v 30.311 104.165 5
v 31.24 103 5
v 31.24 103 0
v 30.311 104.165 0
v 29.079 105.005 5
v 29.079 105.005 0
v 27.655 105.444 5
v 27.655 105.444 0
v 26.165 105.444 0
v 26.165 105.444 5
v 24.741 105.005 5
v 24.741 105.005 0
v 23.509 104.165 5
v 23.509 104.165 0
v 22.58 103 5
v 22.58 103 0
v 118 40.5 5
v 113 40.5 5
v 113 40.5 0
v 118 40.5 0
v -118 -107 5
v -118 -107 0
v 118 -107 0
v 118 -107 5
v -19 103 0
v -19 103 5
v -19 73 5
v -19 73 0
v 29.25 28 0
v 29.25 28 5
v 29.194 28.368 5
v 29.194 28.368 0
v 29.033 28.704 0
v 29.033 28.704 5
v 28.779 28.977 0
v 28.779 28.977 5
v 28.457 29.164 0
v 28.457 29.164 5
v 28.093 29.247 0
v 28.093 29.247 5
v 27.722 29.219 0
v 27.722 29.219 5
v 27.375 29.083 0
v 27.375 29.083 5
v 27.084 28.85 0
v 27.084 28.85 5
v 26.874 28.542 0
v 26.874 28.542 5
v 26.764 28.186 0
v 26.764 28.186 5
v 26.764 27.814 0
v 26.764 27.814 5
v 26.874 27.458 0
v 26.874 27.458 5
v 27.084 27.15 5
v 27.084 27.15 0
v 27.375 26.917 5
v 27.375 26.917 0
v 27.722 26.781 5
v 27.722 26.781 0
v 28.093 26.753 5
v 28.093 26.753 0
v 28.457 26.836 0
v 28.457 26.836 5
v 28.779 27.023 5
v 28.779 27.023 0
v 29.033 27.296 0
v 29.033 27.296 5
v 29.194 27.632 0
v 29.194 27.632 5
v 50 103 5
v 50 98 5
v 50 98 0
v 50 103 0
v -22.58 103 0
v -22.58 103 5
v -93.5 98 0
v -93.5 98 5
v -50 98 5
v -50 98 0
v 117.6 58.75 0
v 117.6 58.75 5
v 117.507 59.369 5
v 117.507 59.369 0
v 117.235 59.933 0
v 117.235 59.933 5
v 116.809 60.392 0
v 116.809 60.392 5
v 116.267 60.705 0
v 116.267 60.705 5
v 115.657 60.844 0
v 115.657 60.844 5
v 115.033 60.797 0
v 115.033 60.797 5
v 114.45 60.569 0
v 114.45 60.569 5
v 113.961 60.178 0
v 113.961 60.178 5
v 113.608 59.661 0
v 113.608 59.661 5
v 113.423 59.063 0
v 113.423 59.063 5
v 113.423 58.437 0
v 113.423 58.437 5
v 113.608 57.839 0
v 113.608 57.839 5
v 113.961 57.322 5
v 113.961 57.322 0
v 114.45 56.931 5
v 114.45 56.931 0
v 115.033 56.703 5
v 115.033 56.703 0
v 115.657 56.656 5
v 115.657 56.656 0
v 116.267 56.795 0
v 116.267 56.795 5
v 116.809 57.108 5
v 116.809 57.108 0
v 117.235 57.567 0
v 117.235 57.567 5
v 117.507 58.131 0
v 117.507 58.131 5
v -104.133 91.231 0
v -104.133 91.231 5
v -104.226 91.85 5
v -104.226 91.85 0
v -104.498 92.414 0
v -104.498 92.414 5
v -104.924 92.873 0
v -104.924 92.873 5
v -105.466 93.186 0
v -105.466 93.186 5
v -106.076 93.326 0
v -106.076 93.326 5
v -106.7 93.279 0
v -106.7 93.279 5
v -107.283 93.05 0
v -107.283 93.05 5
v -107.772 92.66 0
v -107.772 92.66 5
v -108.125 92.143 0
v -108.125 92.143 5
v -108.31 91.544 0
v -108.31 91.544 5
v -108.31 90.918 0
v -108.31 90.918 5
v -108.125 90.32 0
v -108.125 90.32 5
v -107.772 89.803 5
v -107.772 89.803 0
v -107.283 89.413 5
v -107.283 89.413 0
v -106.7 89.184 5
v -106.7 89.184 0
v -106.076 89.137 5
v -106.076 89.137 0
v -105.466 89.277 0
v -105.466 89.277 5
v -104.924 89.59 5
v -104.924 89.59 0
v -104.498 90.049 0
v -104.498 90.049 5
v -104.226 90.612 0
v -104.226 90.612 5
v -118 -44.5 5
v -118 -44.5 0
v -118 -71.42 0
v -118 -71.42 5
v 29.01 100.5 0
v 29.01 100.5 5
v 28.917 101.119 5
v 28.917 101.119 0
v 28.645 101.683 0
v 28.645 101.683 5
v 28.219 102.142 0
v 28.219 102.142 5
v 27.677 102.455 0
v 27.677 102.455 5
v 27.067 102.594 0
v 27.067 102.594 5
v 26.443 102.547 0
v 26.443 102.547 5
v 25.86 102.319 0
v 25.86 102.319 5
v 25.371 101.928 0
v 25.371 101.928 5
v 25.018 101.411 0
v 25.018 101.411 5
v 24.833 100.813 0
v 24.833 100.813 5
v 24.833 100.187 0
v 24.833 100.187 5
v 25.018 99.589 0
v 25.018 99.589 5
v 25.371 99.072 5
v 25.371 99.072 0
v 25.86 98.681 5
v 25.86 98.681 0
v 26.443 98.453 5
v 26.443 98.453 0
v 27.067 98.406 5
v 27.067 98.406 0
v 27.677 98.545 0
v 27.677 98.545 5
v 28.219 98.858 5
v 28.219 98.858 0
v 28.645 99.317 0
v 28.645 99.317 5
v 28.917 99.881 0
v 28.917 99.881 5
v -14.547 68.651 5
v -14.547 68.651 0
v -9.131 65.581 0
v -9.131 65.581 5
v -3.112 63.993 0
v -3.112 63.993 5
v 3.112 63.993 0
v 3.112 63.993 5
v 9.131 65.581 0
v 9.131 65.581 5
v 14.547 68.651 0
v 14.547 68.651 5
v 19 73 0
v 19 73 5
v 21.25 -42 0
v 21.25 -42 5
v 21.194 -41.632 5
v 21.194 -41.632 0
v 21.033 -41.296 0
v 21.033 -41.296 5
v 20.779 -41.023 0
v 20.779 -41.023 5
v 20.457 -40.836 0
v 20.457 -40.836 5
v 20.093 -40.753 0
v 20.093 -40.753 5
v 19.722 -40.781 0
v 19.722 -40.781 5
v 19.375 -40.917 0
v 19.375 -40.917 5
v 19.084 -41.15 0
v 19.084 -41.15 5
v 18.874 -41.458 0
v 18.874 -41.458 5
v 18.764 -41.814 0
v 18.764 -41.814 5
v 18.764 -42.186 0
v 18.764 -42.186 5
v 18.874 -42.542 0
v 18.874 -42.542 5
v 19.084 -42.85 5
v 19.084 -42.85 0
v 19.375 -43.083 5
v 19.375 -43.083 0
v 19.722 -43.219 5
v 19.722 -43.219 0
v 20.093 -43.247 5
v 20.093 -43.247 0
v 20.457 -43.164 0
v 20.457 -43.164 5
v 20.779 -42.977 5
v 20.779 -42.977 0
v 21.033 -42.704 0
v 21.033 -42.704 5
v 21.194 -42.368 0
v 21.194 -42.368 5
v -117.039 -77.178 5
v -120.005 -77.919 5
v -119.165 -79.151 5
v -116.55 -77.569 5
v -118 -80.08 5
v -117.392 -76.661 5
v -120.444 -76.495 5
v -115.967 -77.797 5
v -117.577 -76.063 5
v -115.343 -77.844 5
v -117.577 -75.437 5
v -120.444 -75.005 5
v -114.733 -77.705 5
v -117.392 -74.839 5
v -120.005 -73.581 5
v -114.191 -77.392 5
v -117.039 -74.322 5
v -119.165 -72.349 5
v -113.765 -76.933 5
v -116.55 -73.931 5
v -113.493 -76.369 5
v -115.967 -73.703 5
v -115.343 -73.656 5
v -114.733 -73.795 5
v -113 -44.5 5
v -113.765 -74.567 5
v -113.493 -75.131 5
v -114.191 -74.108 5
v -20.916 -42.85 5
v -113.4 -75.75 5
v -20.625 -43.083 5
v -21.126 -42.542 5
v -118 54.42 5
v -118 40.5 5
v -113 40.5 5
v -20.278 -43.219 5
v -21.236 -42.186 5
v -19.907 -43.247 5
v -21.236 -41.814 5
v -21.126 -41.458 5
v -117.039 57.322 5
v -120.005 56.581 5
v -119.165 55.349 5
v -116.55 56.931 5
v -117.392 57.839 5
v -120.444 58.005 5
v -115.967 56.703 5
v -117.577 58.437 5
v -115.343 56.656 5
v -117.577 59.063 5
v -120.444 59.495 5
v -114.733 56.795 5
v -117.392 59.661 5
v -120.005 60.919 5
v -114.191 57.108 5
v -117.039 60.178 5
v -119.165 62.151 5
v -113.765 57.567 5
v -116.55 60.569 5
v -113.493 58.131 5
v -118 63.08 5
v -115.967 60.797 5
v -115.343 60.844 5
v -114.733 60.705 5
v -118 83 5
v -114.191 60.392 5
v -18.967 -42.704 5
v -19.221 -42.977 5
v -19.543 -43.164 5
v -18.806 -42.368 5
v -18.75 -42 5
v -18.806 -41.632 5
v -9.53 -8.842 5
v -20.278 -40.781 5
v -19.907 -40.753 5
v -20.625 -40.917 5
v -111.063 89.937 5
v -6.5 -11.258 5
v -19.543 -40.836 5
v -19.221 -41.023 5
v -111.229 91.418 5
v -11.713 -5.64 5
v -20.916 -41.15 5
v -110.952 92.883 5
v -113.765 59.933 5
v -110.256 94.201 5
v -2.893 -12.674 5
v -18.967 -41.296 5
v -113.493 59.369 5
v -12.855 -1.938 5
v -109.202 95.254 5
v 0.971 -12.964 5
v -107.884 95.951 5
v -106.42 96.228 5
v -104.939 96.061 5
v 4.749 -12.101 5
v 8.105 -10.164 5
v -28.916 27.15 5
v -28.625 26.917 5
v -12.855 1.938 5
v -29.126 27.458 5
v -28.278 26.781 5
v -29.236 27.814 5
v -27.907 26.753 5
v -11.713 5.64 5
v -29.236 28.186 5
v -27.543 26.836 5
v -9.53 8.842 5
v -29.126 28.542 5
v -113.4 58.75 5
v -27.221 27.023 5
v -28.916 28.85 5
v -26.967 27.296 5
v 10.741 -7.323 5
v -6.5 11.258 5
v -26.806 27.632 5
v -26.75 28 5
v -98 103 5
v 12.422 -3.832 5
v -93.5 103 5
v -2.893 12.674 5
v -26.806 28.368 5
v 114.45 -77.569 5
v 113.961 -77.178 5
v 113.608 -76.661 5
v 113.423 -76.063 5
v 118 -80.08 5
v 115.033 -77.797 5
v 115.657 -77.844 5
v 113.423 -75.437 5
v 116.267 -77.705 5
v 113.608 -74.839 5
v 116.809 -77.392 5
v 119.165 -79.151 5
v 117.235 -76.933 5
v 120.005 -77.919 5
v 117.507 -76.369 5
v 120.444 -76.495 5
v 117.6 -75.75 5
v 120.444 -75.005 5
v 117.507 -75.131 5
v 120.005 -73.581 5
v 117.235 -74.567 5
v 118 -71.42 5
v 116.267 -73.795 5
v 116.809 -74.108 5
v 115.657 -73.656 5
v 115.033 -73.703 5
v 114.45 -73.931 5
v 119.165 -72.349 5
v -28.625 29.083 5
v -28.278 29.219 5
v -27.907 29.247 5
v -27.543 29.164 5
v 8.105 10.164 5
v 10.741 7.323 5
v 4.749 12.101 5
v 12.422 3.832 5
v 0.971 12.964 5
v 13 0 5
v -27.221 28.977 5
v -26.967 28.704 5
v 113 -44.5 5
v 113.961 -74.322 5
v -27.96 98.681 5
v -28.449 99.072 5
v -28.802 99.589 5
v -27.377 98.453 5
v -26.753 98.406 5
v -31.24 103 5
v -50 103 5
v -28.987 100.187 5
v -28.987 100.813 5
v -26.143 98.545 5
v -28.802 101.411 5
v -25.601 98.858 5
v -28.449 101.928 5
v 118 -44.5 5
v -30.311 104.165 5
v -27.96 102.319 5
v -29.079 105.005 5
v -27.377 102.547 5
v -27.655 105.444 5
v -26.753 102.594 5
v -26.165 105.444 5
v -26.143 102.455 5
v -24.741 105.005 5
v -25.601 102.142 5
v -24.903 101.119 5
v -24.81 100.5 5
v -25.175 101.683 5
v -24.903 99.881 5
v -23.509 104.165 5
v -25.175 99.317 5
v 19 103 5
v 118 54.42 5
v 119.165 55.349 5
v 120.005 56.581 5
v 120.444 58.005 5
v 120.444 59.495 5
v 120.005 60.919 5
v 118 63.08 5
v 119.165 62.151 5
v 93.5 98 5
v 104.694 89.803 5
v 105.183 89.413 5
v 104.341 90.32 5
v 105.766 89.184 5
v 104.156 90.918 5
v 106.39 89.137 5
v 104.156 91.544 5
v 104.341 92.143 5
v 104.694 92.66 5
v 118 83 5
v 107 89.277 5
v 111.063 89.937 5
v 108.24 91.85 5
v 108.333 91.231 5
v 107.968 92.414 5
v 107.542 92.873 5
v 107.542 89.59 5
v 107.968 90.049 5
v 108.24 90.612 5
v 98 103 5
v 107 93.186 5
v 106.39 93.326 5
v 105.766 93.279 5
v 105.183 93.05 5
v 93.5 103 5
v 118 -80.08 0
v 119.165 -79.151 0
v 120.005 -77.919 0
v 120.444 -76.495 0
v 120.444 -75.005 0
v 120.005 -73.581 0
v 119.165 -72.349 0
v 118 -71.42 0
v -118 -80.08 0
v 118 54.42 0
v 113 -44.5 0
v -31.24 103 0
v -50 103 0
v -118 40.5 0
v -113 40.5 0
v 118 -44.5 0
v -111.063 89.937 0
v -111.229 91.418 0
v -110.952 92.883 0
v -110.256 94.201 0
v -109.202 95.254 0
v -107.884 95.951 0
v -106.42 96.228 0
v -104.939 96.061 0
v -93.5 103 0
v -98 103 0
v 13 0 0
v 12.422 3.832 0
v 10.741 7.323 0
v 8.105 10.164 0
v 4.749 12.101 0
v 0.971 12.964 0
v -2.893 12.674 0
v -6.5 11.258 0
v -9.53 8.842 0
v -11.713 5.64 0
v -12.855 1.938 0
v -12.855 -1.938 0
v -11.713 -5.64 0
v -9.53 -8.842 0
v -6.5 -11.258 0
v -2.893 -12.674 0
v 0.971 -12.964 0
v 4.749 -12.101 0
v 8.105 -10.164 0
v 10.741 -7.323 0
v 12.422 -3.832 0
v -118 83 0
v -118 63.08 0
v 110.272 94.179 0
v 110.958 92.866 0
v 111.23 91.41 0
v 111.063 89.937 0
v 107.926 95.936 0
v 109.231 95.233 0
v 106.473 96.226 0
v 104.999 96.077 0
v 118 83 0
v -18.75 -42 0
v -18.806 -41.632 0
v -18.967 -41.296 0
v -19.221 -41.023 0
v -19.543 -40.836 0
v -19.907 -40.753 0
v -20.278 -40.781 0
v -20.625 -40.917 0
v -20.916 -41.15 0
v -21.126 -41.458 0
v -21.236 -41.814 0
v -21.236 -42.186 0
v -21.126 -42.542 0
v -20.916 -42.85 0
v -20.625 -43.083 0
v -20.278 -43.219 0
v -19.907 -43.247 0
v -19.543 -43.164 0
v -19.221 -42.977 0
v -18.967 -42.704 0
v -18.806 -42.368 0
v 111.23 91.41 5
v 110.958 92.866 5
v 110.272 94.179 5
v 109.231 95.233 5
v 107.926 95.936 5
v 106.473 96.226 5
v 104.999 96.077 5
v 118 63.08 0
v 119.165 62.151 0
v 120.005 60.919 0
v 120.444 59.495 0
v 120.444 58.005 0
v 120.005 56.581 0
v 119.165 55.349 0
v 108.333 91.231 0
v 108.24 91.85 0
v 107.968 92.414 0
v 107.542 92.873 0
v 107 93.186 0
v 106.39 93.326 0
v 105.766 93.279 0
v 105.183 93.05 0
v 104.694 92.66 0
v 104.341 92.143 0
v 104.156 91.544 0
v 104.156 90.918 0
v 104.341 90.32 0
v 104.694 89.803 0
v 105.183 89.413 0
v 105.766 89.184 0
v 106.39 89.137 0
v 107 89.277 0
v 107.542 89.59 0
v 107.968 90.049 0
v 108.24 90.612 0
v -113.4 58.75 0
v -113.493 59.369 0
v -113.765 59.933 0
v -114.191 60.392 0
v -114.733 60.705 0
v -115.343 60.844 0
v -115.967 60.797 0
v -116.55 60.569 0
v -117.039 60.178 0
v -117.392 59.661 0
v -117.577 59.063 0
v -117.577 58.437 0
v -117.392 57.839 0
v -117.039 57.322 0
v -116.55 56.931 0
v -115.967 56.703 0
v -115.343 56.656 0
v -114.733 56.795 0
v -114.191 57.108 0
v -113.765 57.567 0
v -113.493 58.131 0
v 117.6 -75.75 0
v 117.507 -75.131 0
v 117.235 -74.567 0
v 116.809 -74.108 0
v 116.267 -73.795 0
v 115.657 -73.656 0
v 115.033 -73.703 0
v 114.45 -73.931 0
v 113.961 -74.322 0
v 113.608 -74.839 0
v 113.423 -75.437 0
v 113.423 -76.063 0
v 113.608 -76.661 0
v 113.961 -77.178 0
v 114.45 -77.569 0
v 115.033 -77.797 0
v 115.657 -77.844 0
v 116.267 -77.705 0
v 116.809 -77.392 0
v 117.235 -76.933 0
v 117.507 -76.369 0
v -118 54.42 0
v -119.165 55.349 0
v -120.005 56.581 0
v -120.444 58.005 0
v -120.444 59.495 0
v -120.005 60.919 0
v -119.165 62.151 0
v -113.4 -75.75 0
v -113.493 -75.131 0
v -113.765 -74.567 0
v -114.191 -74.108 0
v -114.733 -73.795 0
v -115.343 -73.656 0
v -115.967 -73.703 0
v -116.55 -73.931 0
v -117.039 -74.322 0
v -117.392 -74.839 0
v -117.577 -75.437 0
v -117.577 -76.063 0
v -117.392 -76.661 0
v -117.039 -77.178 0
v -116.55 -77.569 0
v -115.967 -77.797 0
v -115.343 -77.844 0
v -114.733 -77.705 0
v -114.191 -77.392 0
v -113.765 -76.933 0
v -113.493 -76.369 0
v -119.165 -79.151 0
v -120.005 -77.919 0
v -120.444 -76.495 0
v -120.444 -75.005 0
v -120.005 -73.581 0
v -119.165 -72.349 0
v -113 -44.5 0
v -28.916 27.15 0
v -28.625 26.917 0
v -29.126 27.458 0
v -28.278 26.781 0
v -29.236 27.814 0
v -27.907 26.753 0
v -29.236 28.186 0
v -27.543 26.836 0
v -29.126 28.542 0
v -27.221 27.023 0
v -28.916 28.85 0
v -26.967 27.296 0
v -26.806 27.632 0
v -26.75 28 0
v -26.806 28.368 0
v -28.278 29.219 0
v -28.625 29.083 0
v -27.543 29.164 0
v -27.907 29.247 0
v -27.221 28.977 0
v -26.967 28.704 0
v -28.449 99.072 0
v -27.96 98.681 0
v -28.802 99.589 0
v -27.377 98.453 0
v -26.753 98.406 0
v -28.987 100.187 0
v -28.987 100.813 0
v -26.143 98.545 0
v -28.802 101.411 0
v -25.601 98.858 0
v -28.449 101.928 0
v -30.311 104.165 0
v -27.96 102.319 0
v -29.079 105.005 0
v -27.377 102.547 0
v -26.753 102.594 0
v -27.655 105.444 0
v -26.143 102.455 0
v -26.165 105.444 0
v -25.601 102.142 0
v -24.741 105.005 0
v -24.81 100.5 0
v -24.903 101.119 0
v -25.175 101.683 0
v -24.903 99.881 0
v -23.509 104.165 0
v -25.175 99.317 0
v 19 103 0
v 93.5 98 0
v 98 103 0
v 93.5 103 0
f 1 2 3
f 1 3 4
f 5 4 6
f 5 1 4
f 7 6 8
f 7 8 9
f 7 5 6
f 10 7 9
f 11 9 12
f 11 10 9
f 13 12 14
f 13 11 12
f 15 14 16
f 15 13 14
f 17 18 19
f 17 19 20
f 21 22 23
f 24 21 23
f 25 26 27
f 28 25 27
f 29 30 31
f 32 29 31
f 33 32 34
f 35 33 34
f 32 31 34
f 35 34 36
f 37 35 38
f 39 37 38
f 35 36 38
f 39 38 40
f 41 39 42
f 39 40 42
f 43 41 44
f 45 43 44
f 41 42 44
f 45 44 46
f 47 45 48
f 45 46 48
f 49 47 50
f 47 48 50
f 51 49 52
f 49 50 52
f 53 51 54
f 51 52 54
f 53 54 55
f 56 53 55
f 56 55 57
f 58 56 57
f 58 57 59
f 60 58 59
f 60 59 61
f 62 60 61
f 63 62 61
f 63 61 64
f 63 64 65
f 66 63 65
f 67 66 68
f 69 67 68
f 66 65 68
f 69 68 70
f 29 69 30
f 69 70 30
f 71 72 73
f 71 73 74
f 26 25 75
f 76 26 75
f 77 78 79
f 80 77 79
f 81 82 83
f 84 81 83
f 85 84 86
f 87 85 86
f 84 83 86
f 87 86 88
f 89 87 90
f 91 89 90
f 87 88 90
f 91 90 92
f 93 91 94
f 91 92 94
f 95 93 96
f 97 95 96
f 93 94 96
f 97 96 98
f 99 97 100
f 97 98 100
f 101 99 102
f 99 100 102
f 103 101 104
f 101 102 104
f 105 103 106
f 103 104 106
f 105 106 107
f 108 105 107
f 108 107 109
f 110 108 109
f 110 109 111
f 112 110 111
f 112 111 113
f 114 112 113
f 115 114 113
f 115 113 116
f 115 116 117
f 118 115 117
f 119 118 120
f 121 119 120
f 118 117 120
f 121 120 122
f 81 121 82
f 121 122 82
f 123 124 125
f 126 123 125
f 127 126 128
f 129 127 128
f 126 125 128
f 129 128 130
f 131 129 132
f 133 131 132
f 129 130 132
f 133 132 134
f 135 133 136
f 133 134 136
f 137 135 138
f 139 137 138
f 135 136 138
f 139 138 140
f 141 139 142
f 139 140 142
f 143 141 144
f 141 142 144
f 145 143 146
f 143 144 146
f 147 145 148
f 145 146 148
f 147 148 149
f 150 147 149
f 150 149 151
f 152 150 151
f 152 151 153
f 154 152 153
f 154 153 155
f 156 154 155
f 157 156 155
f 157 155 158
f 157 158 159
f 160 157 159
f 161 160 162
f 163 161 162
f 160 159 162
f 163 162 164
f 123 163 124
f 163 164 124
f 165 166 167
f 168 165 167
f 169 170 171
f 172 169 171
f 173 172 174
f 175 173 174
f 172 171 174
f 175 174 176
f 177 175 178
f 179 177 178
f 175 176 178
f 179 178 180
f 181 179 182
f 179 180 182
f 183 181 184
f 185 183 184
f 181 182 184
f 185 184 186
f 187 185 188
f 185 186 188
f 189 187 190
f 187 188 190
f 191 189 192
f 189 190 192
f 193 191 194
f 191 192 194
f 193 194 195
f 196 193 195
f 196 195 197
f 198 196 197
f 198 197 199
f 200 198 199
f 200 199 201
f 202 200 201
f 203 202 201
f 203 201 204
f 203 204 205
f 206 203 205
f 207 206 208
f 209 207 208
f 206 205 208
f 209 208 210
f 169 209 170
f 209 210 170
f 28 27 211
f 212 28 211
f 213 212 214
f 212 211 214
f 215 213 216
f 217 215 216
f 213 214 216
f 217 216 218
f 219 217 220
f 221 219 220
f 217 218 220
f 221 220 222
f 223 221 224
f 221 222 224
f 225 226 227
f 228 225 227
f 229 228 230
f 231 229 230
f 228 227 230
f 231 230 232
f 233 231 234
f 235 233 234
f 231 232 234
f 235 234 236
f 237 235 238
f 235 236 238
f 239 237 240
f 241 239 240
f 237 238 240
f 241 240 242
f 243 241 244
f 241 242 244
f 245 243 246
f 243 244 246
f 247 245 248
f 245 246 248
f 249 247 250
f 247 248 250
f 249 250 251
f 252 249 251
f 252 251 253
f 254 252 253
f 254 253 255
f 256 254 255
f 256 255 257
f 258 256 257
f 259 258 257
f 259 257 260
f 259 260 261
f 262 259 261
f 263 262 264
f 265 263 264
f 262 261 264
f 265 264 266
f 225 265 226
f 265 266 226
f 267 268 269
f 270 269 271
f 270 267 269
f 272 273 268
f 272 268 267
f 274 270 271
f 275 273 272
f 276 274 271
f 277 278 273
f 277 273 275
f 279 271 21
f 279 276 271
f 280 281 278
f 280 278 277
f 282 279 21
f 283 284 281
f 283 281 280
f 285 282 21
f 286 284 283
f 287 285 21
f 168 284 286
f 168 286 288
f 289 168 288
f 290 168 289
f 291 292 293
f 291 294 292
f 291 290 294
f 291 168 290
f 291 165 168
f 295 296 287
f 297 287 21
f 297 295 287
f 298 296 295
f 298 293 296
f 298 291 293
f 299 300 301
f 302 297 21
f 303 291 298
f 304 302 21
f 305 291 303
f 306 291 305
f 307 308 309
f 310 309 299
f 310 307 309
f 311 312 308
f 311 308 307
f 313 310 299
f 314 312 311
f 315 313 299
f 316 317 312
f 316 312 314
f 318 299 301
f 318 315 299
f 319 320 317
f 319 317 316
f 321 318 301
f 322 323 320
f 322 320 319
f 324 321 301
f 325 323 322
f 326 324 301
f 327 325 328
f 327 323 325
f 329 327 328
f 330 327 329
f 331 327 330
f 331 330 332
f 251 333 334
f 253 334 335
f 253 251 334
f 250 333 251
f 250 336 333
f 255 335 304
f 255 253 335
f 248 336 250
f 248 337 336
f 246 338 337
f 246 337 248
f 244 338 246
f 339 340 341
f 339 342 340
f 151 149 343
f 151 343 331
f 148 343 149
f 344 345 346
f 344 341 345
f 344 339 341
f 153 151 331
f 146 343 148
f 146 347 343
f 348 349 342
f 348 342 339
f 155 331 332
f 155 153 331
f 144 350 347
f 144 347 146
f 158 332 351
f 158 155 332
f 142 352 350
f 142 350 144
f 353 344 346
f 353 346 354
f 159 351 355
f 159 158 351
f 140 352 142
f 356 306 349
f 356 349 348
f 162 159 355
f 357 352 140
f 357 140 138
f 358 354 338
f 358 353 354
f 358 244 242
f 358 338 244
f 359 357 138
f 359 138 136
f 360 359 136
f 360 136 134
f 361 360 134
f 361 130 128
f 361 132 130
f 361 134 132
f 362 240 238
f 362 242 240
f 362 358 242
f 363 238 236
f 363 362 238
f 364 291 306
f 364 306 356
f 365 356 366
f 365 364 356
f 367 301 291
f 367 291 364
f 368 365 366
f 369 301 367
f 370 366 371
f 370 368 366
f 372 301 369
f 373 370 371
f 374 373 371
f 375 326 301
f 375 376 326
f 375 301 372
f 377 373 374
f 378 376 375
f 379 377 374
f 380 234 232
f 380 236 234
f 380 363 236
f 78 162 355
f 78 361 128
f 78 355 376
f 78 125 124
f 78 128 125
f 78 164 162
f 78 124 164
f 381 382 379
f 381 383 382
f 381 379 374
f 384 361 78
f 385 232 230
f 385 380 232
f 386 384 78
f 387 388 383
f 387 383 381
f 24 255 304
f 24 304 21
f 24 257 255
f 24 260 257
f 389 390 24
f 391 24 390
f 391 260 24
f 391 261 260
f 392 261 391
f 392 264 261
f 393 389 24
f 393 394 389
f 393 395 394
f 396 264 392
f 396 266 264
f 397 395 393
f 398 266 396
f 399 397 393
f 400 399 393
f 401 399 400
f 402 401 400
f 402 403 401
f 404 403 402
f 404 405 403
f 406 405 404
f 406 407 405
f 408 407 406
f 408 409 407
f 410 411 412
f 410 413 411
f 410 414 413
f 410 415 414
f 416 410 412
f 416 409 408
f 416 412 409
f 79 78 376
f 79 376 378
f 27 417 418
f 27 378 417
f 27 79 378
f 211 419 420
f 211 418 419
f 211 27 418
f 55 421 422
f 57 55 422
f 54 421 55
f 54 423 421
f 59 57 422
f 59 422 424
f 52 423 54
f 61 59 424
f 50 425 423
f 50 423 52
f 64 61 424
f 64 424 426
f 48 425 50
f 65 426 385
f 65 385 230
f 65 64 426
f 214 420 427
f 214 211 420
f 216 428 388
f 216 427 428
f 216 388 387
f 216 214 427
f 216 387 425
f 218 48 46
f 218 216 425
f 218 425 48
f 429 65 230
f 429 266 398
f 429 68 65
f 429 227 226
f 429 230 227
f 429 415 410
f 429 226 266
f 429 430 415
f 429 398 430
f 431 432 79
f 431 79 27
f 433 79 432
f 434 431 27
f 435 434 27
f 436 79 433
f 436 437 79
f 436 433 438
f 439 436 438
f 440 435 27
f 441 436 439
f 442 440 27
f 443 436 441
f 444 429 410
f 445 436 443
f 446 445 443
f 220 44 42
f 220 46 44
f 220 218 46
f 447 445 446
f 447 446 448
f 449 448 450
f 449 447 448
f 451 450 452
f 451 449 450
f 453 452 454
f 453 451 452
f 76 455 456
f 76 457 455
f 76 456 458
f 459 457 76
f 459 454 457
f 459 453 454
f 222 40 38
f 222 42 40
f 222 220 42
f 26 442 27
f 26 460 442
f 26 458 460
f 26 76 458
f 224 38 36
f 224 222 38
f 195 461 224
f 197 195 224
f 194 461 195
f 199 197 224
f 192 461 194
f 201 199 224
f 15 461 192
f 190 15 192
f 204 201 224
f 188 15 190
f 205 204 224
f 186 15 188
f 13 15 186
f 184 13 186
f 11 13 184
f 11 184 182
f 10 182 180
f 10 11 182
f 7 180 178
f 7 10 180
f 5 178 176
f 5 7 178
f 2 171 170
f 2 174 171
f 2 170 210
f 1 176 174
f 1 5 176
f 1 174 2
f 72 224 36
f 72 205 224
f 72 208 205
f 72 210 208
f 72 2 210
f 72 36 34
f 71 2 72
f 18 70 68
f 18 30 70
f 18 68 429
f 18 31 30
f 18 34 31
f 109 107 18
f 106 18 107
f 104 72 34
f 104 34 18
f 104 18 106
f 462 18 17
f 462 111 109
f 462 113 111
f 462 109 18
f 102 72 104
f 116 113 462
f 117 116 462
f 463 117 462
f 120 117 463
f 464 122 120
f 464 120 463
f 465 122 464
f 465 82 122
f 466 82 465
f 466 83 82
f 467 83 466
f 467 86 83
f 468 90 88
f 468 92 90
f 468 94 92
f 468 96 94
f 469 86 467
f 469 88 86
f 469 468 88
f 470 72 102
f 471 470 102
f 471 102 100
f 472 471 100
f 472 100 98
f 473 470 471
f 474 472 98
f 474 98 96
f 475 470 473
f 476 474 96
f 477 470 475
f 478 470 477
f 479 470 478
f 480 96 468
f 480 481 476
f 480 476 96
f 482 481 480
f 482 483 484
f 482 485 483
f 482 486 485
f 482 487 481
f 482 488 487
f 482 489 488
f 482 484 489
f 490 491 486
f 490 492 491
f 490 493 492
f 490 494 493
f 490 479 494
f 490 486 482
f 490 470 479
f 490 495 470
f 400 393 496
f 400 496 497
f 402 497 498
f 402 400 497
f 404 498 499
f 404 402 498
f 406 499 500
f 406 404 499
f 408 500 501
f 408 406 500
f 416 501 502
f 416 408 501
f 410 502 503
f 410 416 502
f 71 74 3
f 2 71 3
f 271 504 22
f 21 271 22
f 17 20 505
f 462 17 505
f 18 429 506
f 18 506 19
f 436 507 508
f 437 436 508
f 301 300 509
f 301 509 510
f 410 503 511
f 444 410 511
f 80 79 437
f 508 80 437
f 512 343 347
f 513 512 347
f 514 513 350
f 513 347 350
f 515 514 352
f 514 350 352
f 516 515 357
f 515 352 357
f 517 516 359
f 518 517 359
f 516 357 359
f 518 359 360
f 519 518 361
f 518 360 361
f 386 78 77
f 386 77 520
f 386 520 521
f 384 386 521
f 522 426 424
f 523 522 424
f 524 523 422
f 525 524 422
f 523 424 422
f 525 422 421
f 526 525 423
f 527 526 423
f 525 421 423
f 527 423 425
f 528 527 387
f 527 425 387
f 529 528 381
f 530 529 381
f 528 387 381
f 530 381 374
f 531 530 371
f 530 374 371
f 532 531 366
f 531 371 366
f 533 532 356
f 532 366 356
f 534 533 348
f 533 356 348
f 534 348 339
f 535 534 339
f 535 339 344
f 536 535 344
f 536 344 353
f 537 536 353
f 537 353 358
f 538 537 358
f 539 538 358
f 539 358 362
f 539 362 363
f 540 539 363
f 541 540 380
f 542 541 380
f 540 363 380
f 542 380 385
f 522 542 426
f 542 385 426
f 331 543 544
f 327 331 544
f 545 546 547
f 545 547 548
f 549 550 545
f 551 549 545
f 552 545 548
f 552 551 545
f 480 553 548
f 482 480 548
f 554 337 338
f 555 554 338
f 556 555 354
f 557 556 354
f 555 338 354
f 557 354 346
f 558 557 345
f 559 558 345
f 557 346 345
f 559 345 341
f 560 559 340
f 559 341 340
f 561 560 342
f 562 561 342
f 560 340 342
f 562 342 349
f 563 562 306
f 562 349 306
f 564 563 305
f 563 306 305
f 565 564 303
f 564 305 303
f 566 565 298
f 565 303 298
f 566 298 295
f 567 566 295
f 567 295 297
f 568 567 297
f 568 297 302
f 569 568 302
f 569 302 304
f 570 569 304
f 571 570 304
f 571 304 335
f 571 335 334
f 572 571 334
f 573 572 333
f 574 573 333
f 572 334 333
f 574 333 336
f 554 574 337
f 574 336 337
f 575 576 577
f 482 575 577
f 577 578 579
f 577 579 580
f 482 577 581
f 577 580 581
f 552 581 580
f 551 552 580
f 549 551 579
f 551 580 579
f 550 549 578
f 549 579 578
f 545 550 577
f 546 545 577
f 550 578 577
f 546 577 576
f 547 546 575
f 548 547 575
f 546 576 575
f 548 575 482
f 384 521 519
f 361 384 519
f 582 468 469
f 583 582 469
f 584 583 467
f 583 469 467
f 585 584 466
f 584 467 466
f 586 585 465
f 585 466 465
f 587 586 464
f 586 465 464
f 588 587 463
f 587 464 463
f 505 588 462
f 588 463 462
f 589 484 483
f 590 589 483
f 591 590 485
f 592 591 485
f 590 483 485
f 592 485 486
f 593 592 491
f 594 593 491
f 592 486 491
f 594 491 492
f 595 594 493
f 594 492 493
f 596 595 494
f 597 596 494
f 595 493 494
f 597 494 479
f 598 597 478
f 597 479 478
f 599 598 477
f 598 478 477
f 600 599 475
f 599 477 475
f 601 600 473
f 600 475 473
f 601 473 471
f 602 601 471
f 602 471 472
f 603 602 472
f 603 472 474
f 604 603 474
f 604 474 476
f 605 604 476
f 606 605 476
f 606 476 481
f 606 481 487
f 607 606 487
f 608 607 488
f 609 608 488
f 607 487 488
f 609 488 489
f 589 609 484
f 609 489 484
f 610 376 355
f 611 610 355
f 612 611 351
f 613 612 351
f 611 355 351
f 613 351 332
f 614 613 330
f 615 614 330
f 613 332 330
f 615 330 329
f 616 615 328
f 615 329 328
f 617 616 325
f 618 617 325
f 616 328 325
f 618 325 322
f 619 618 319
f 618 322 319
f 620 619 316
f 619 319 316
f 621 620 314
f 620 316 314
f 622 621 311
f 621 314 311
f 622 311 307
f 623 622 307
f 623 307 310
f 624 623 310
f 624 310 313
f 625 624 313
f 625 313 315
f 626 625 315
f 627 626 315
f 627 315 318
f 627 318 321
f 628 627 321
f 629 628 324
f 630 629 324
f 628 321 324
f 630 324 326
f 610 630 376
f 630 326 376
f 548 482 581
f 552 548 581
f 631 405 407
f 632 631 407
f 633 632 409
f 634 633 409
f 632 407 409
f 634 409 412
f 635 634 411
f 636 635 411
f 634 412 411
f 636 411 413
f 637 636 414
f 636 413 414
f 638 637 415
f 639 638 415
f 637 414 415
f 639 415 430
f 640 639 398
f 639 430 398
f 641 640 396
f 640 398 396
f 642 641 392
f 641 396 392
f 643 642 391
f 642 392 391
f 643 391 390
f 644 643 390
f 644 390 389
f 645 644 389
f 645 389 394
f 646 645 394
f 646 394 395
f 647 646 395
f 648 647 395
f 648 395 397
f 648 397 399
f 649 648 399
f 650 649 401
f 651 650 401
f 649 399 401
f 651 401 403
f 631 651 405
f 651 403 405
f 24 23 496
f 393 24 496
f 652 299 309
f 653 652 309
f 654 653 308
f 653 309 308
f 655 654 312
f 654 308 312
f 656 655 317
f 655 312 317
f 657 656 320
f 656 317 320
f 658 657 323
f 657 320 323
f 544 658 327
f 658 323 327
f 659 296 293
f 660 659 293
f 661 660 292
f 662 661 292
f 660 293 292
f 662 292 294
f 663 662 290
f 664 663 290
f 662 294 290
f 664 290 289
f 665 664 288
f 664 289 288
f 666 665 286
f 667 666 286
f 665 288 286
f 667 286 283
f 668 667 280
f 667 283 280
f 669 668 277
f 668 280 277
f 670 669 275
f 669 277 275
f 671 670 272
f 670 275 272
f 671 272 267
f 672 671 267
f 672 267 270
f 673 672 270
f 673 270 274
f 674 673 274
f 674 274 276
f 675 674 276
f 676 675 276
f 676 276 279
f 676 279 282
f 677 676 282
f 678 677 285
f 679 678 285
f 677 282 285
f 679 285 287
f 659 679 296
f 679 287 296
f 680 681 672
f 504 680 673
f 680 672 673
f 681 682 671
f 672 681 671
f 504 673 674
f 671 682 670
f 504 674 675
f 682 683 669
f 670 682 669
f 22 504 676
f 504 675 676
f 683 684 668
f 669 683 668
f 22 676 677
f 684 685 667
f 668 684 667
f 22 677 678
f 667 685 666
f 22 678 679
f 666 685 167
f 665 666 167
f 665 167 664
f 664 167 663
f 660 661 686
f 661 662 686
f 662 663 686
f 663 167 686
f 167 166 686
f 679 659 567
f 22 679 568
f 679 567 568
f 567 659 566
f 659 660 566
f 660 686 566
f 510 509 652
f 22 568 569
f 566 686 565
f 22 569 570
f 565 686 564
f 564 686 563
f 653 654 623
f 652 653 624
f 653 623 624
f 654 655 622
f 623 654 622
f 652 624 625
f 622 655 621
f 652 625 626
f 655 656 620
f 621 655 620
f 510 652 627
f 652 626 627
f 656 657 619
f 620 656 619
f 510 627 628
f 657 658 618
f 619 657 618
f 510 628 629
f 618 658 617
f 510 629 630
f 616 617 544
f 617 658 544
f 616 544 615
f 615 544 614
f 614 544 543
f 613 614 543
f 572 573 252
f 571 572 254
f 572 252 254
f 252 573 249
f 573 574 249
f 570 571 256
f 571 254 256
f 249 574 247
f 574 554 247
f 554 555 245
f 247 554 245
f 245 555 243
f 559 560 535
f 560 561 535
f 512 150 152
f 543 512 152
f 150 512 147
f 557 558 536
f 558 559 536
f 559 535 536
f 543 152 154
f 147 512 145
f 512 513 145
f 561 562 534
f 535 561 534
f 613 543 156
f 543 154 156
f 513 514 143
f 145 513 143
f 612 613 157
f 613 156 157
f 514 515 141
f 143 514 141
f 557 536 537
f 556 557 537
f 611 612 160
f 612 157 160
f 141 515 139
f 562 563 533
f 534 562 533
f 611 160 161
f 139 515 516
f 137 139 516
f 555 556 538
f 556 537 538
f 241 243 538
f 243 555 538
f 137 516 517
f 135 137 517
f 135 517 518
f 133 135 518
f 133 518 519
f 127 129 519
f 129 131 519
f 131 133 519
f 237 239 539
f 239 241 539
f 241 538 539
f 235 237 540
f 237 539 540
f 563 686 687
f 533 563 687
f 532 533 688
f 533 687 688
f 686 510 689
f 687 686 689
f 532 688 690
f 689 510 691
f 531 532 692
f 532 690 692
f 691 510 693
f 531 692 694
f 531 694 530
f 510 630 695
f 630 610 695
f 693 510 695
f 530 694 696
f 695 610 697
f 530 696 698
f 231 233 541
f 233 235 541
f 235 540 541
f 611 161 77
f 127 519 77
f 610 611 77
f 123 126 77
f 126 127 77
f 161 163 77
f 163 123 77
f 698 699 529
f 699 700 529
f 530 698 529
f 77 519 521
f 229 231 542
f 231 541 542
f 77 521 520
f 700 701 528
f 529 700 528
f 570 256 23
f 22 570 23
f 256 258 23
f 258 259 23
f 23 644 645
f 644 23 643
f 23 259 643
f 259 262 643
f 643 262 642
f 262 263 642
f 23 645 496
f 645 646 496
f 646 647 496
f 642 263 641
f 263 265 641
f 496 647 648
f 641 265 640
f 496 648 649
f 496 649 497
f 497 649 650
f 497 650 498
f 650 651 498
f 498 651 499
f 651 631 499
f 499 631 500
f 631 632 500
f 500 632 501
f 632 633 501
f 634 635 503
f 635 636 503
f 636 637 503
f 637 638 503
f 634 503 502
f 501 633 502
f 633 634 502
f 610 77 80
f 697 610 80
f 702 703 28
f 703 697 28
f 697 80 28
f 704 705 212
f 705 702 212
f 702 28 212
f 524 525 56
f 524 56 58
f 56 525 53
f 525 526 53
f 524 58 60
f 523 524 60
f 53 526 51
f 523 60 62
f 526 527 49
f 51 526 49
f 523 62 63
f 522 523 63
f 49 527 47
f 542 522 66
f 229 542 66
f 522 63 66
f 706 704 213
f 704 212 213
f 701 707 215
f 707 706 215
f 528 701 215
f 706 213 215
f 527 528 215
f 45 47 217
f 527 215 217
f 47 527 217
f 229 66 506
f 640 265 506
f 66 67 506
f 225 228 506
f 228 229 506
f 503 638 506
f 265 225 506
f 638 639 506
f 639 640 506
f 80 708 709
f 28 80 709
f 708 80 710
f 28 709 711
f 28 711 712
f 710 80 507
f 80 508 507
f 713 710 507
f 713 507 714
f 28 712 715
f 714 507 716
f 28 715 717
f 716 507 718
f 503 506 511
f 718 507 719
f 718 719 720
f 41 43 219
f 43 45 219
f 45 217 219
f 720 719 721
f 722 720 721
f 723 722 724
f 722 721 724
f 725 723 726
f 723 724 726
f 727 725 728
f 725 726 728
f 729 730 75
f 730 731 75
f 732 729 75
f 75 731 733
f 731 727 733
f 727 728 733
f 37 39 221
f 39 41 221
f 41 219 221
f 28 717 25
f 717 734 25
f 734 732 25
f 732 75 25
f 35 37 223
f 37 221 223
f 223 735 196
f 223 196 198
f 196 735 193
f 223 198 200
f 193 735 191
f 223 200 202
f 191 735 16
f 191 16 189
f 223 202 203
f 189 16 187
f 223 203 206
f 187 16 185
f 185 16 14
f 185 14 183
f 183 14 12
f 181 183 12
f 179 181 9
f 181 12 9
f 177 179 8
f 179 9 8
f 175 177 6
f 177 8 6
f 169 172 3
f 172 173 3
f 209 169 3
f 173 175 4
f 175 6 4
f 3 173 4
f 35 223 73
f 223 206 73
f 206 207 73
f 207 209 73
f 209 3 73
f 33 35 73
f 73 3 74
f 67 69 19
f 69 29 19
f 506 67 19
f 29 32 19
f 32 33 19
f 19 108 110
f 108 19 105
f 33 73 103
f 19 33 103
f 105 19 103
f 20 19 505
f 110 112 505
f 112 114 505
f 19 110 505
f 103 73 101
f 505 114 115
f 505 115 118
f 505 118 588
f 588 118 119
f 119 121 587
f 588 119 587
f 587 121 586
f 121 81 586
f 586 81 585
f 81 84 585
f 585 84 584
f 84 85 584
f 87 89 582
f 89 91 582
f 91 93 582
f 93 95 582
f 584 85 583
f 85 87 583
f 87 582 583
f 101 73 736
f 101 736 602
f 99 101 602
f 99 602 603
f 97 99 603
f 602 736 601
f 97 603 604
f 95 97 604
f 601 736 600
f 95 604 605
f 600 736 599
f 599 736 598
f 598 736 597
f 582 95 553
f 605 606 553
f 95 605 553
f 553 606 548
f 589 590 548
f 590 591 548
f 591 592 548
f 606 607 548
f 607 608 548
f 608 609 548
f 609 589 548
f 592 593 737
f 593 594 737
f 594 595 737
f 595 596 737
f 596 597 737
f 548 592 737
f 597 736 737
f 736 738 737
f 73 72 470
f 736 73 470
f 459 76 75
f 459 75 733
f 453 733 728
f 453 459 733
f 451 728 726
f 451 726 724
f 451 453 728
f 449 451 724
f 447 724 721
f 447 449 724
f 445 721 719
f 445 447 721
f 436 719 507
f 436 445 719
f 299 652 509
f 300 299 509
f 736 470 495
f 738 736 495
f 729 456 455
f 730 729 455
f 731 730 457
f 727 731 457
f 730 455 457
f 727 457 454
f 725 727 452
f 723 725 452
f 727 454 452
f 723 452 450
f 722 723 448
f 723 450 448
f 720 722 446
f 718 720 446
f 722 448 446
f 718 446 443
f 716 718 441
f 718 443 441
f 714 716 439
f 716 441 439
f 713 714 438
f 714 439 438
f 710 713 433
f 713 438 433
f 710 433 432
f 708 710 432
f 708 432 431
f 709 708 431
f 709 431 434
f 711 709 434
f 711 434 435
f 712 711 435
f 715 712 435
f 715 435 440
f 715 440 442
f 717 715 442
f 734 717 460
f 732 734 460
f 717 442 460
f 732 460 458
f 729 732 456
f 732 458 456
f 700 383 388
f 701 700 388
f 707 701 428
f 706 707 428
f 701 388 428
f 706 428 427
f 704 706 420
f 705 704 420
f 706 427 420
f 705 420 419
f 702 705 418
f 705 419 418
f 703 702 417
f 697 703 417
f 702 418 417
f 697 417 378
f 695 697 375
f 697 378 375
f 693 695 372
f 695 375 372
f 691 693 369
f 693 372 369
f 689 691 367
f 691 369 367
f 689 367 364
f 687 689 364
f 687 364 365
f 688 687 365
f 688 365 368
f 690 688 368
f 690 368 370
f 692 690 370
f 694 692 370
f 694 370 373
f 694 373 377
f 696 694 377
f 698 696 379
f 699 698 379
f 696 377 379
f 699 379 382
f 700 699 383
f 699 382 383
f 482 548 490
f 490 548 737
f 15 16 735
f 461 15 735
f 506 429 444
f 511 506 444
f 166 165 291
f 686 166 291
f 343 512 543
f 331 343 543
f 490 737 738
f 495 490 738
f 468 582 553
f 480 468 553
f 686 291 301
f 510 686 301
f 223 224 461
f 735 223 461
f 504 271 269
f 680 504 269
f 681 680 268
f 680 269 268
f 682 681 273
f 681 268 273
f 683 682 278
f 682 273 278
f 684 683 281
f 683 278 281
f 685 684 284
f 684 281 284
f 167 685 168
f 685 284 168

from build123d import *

# Parameters (mm, degrees)
BOSS_EXTRUDE1_DEPTH     = 5
SKETCH4_W               = 5
SKETCH4_H               = 85
CUT_EXTRUDE3_DEPTH      = 6
SKETCH5_W               = 43.5
SKETCH5_H               = 5
CUT_EXTRUDE4_DEPTH      = 5
SKETCH6_R               = 2.1
CUT_EXTRUDE5_DEPTH      = 5
BOSS_EXTRUDE2_DEPTH     = 5
SKETCH8_R               = 13
CUT_EXTRUDE6_DEPTH      = 5
SKETCH9_R               = 1.25
CUT_EXTRUDE7_DEPTH      = 5
CUT_EXTRUDE8_DEPTH      = 1
CUT_EXTRUDE8_DEPTH_BACK = 5


with BuildPart() as part:
    # Sketch1 → Boss-Extrude1 (new body)
    with BuildSketch(Plane.XY):
        Polygon((64.226162893, -107), (118, -107), (118, 83), (98, 103), (-98, 103), (-118, 83), (-118, -107), (-64.226162893, -107), align=None)
    extrude(amount=BOSS_EXTRUDE1_DEPTH)

    # Sketch4 → Cut-Extrude3 (cut, through all)
    with BuildSketch(Plane.XY.offset(5)):
        with Locations((-115.5, -2)):
            Rectangle(SKETCH4_W, SKETCH4_H)
        with Locations((115.5, -2)):
            Rectangle(SKETCH4_W, SKETCH4_H)
    extrude(amount=-CUT_EXTRUDE3_DEPTH, mode=Mode.SUBTRACT)

    # Sketch5 → Cut-Extrude4 (cut)
    with BuildSketch(Plane.XY.offset(5)):
        with Locations((71.75, 100.5)):
            Rectangle(SKETCH5_W, SKETCH5_H)
        with Locations((-71.75, 100.5)):
            Rectangle(SKETCH5_W, SKETCH5_H)
    extrude(amount=-CUT_EXTRUDE4_DEPTH, mode=Mode.SUBTRACT)

    # Sketch6 → Cut-Extrude5 (cut)
    with BuildSketch(Plane.XY.offset(5)):
        with Locations((-106.232988104, 91.23147799)):
            Circle(SKETCH6_R)
        with Locations((106.232988104, 91.23147799)):
            Circle(SKETCH6_R)
        with Locations((115.5, 58.75)):
            Circle(SKETCH6_R)
        with Locations((115.5, -75.75)):
            Circle(SKETCH6_R)
        with Locations((-115.5, 58.75)):
            Circle(SKETCH6_R)
        with Locations((-115.5, -75.75)):
            Circle(SKETCH6_R)
        with Locations((-26.91, 100.5)):
            Circle(SKETCH6_R)
        with Locations((26.91, 100.5)):
            Circle(SKETCH6_R)
    extrude(amount=-CUT_EXTRUDE5_DEPTH, mode=Mode.SUBTRACT)

    # Sketch7 → Boss-Extrude2 (add)
    with BuildSketch(Plane.XY.offset(5)):
        with BuildLine():
            Line((-104.938892879, 96.061107121), (-111.062617235, 89.937382765))
            ThreePointArc((-111.062617235, 89.937382765), (-109.76852201, 94.767011896), (-104.938892879, 96.061107121))
        make_face()
        with BuildLine():
            Line((-118, 63.080127019), (-118, 54.419872981))
            ThreePointArc((-118, 54.419872981), (-120.5, 58.75), (-118, 63.080127019))
        make_face()
        with BuildLine():
            Line((-118, -71.419872981), (-118, -80.080127019))
            ThreePointArc((-118, -80.080127019), (-120.5, -75.75), (-118, -71.419872981))
        make_face()
        with BuildLine():
            Line((118, -71.419872981), (118, -80.080127019))
            ThreePointArc((118, -80.080127019), (120.5, -75.75), (118, -71.419872981))
        make_face()
        with BuildLine():
            Line((111.062617235, 89.937382765), (104.999243157, 96.076875126))
            ThreePointArc((104.999243157, 96.076875126), (109.790506534, 94.74488981), (111.062617235, 89.937382765))
        make_face()
        with BuildLine():
            Line((118, 54.419872981), (118, 63.080127019))
            ThreePointArc((118, 63.080127019), (120.5, 58.75), (118, 54.419872981))
        make_face()
        with BuildLine():
            Line((22.579872981, 103), (31.240127019, 103))
            ThreePointArc((31.240127019, 103), (26.91, 105.5), (22.579872981, 103))
        make_face()
        with BuildLine():
            Line((-31.240127019, 103), (-22.579872981, 103))
            ThreePointArc((-22.579872981, 103), (-26.91, 105.5), (-31.240127019, 103))
        make_face()
    extrude(amount=-BOSS_EXTRUDE2_DEPTH)

    # Sketch8 → Cut-Extrude6 (cut)
    with BuildSketch(Plane.XY.offset(5)):
        Circle(SKETCH8_R)
    extrude(amount=-CUT_EXTRUDE6_DEPTH, mode=Mode.SUBTRACT)

    # Sketch9 → Cut-Extrude7 (cut)
    with BuildSketch(Plane.XY.offset(5)):
        with Locations((28, 28)):
            Circle(SKETCH9_R)
        with Locations((20, -42)):
            Circle(SKETCH9_R)
        with Locations((-20, -42)):
            Circle(SKETCH9_R)
        with Locations((-28, 28)):
            Circle(SKETCH9_R)
    extrude(amount=-CUT_EXTRUDE7_DEPTH, mode=Mode.SUBTRACT)

    # Sketch10 → Cut-Extrude8 (cut, two sides)
    with BuildSketch(Plane.XY.offset(5)) as cut_extrude8_sk:
        with BuildLine():
            Line((19, 73), (19, 103))
            Line((19, 103), (-19, 103))
            Line((-19, 103), (-19, 73))
            ThreePointArc((-19, 73), (0, 63.792563126), (19, 73))
        make_face()
    extrude(amount=CUT_EXTRUDE8_DEPTH, mode=Mode.SUBTRACT)
    extrude(cut_extrude8_sk.sketch, amount=-CUT_EXTRUDE8_DEPTH_BACK, mode=Mode.SUBTRACT)


solid = part.part
